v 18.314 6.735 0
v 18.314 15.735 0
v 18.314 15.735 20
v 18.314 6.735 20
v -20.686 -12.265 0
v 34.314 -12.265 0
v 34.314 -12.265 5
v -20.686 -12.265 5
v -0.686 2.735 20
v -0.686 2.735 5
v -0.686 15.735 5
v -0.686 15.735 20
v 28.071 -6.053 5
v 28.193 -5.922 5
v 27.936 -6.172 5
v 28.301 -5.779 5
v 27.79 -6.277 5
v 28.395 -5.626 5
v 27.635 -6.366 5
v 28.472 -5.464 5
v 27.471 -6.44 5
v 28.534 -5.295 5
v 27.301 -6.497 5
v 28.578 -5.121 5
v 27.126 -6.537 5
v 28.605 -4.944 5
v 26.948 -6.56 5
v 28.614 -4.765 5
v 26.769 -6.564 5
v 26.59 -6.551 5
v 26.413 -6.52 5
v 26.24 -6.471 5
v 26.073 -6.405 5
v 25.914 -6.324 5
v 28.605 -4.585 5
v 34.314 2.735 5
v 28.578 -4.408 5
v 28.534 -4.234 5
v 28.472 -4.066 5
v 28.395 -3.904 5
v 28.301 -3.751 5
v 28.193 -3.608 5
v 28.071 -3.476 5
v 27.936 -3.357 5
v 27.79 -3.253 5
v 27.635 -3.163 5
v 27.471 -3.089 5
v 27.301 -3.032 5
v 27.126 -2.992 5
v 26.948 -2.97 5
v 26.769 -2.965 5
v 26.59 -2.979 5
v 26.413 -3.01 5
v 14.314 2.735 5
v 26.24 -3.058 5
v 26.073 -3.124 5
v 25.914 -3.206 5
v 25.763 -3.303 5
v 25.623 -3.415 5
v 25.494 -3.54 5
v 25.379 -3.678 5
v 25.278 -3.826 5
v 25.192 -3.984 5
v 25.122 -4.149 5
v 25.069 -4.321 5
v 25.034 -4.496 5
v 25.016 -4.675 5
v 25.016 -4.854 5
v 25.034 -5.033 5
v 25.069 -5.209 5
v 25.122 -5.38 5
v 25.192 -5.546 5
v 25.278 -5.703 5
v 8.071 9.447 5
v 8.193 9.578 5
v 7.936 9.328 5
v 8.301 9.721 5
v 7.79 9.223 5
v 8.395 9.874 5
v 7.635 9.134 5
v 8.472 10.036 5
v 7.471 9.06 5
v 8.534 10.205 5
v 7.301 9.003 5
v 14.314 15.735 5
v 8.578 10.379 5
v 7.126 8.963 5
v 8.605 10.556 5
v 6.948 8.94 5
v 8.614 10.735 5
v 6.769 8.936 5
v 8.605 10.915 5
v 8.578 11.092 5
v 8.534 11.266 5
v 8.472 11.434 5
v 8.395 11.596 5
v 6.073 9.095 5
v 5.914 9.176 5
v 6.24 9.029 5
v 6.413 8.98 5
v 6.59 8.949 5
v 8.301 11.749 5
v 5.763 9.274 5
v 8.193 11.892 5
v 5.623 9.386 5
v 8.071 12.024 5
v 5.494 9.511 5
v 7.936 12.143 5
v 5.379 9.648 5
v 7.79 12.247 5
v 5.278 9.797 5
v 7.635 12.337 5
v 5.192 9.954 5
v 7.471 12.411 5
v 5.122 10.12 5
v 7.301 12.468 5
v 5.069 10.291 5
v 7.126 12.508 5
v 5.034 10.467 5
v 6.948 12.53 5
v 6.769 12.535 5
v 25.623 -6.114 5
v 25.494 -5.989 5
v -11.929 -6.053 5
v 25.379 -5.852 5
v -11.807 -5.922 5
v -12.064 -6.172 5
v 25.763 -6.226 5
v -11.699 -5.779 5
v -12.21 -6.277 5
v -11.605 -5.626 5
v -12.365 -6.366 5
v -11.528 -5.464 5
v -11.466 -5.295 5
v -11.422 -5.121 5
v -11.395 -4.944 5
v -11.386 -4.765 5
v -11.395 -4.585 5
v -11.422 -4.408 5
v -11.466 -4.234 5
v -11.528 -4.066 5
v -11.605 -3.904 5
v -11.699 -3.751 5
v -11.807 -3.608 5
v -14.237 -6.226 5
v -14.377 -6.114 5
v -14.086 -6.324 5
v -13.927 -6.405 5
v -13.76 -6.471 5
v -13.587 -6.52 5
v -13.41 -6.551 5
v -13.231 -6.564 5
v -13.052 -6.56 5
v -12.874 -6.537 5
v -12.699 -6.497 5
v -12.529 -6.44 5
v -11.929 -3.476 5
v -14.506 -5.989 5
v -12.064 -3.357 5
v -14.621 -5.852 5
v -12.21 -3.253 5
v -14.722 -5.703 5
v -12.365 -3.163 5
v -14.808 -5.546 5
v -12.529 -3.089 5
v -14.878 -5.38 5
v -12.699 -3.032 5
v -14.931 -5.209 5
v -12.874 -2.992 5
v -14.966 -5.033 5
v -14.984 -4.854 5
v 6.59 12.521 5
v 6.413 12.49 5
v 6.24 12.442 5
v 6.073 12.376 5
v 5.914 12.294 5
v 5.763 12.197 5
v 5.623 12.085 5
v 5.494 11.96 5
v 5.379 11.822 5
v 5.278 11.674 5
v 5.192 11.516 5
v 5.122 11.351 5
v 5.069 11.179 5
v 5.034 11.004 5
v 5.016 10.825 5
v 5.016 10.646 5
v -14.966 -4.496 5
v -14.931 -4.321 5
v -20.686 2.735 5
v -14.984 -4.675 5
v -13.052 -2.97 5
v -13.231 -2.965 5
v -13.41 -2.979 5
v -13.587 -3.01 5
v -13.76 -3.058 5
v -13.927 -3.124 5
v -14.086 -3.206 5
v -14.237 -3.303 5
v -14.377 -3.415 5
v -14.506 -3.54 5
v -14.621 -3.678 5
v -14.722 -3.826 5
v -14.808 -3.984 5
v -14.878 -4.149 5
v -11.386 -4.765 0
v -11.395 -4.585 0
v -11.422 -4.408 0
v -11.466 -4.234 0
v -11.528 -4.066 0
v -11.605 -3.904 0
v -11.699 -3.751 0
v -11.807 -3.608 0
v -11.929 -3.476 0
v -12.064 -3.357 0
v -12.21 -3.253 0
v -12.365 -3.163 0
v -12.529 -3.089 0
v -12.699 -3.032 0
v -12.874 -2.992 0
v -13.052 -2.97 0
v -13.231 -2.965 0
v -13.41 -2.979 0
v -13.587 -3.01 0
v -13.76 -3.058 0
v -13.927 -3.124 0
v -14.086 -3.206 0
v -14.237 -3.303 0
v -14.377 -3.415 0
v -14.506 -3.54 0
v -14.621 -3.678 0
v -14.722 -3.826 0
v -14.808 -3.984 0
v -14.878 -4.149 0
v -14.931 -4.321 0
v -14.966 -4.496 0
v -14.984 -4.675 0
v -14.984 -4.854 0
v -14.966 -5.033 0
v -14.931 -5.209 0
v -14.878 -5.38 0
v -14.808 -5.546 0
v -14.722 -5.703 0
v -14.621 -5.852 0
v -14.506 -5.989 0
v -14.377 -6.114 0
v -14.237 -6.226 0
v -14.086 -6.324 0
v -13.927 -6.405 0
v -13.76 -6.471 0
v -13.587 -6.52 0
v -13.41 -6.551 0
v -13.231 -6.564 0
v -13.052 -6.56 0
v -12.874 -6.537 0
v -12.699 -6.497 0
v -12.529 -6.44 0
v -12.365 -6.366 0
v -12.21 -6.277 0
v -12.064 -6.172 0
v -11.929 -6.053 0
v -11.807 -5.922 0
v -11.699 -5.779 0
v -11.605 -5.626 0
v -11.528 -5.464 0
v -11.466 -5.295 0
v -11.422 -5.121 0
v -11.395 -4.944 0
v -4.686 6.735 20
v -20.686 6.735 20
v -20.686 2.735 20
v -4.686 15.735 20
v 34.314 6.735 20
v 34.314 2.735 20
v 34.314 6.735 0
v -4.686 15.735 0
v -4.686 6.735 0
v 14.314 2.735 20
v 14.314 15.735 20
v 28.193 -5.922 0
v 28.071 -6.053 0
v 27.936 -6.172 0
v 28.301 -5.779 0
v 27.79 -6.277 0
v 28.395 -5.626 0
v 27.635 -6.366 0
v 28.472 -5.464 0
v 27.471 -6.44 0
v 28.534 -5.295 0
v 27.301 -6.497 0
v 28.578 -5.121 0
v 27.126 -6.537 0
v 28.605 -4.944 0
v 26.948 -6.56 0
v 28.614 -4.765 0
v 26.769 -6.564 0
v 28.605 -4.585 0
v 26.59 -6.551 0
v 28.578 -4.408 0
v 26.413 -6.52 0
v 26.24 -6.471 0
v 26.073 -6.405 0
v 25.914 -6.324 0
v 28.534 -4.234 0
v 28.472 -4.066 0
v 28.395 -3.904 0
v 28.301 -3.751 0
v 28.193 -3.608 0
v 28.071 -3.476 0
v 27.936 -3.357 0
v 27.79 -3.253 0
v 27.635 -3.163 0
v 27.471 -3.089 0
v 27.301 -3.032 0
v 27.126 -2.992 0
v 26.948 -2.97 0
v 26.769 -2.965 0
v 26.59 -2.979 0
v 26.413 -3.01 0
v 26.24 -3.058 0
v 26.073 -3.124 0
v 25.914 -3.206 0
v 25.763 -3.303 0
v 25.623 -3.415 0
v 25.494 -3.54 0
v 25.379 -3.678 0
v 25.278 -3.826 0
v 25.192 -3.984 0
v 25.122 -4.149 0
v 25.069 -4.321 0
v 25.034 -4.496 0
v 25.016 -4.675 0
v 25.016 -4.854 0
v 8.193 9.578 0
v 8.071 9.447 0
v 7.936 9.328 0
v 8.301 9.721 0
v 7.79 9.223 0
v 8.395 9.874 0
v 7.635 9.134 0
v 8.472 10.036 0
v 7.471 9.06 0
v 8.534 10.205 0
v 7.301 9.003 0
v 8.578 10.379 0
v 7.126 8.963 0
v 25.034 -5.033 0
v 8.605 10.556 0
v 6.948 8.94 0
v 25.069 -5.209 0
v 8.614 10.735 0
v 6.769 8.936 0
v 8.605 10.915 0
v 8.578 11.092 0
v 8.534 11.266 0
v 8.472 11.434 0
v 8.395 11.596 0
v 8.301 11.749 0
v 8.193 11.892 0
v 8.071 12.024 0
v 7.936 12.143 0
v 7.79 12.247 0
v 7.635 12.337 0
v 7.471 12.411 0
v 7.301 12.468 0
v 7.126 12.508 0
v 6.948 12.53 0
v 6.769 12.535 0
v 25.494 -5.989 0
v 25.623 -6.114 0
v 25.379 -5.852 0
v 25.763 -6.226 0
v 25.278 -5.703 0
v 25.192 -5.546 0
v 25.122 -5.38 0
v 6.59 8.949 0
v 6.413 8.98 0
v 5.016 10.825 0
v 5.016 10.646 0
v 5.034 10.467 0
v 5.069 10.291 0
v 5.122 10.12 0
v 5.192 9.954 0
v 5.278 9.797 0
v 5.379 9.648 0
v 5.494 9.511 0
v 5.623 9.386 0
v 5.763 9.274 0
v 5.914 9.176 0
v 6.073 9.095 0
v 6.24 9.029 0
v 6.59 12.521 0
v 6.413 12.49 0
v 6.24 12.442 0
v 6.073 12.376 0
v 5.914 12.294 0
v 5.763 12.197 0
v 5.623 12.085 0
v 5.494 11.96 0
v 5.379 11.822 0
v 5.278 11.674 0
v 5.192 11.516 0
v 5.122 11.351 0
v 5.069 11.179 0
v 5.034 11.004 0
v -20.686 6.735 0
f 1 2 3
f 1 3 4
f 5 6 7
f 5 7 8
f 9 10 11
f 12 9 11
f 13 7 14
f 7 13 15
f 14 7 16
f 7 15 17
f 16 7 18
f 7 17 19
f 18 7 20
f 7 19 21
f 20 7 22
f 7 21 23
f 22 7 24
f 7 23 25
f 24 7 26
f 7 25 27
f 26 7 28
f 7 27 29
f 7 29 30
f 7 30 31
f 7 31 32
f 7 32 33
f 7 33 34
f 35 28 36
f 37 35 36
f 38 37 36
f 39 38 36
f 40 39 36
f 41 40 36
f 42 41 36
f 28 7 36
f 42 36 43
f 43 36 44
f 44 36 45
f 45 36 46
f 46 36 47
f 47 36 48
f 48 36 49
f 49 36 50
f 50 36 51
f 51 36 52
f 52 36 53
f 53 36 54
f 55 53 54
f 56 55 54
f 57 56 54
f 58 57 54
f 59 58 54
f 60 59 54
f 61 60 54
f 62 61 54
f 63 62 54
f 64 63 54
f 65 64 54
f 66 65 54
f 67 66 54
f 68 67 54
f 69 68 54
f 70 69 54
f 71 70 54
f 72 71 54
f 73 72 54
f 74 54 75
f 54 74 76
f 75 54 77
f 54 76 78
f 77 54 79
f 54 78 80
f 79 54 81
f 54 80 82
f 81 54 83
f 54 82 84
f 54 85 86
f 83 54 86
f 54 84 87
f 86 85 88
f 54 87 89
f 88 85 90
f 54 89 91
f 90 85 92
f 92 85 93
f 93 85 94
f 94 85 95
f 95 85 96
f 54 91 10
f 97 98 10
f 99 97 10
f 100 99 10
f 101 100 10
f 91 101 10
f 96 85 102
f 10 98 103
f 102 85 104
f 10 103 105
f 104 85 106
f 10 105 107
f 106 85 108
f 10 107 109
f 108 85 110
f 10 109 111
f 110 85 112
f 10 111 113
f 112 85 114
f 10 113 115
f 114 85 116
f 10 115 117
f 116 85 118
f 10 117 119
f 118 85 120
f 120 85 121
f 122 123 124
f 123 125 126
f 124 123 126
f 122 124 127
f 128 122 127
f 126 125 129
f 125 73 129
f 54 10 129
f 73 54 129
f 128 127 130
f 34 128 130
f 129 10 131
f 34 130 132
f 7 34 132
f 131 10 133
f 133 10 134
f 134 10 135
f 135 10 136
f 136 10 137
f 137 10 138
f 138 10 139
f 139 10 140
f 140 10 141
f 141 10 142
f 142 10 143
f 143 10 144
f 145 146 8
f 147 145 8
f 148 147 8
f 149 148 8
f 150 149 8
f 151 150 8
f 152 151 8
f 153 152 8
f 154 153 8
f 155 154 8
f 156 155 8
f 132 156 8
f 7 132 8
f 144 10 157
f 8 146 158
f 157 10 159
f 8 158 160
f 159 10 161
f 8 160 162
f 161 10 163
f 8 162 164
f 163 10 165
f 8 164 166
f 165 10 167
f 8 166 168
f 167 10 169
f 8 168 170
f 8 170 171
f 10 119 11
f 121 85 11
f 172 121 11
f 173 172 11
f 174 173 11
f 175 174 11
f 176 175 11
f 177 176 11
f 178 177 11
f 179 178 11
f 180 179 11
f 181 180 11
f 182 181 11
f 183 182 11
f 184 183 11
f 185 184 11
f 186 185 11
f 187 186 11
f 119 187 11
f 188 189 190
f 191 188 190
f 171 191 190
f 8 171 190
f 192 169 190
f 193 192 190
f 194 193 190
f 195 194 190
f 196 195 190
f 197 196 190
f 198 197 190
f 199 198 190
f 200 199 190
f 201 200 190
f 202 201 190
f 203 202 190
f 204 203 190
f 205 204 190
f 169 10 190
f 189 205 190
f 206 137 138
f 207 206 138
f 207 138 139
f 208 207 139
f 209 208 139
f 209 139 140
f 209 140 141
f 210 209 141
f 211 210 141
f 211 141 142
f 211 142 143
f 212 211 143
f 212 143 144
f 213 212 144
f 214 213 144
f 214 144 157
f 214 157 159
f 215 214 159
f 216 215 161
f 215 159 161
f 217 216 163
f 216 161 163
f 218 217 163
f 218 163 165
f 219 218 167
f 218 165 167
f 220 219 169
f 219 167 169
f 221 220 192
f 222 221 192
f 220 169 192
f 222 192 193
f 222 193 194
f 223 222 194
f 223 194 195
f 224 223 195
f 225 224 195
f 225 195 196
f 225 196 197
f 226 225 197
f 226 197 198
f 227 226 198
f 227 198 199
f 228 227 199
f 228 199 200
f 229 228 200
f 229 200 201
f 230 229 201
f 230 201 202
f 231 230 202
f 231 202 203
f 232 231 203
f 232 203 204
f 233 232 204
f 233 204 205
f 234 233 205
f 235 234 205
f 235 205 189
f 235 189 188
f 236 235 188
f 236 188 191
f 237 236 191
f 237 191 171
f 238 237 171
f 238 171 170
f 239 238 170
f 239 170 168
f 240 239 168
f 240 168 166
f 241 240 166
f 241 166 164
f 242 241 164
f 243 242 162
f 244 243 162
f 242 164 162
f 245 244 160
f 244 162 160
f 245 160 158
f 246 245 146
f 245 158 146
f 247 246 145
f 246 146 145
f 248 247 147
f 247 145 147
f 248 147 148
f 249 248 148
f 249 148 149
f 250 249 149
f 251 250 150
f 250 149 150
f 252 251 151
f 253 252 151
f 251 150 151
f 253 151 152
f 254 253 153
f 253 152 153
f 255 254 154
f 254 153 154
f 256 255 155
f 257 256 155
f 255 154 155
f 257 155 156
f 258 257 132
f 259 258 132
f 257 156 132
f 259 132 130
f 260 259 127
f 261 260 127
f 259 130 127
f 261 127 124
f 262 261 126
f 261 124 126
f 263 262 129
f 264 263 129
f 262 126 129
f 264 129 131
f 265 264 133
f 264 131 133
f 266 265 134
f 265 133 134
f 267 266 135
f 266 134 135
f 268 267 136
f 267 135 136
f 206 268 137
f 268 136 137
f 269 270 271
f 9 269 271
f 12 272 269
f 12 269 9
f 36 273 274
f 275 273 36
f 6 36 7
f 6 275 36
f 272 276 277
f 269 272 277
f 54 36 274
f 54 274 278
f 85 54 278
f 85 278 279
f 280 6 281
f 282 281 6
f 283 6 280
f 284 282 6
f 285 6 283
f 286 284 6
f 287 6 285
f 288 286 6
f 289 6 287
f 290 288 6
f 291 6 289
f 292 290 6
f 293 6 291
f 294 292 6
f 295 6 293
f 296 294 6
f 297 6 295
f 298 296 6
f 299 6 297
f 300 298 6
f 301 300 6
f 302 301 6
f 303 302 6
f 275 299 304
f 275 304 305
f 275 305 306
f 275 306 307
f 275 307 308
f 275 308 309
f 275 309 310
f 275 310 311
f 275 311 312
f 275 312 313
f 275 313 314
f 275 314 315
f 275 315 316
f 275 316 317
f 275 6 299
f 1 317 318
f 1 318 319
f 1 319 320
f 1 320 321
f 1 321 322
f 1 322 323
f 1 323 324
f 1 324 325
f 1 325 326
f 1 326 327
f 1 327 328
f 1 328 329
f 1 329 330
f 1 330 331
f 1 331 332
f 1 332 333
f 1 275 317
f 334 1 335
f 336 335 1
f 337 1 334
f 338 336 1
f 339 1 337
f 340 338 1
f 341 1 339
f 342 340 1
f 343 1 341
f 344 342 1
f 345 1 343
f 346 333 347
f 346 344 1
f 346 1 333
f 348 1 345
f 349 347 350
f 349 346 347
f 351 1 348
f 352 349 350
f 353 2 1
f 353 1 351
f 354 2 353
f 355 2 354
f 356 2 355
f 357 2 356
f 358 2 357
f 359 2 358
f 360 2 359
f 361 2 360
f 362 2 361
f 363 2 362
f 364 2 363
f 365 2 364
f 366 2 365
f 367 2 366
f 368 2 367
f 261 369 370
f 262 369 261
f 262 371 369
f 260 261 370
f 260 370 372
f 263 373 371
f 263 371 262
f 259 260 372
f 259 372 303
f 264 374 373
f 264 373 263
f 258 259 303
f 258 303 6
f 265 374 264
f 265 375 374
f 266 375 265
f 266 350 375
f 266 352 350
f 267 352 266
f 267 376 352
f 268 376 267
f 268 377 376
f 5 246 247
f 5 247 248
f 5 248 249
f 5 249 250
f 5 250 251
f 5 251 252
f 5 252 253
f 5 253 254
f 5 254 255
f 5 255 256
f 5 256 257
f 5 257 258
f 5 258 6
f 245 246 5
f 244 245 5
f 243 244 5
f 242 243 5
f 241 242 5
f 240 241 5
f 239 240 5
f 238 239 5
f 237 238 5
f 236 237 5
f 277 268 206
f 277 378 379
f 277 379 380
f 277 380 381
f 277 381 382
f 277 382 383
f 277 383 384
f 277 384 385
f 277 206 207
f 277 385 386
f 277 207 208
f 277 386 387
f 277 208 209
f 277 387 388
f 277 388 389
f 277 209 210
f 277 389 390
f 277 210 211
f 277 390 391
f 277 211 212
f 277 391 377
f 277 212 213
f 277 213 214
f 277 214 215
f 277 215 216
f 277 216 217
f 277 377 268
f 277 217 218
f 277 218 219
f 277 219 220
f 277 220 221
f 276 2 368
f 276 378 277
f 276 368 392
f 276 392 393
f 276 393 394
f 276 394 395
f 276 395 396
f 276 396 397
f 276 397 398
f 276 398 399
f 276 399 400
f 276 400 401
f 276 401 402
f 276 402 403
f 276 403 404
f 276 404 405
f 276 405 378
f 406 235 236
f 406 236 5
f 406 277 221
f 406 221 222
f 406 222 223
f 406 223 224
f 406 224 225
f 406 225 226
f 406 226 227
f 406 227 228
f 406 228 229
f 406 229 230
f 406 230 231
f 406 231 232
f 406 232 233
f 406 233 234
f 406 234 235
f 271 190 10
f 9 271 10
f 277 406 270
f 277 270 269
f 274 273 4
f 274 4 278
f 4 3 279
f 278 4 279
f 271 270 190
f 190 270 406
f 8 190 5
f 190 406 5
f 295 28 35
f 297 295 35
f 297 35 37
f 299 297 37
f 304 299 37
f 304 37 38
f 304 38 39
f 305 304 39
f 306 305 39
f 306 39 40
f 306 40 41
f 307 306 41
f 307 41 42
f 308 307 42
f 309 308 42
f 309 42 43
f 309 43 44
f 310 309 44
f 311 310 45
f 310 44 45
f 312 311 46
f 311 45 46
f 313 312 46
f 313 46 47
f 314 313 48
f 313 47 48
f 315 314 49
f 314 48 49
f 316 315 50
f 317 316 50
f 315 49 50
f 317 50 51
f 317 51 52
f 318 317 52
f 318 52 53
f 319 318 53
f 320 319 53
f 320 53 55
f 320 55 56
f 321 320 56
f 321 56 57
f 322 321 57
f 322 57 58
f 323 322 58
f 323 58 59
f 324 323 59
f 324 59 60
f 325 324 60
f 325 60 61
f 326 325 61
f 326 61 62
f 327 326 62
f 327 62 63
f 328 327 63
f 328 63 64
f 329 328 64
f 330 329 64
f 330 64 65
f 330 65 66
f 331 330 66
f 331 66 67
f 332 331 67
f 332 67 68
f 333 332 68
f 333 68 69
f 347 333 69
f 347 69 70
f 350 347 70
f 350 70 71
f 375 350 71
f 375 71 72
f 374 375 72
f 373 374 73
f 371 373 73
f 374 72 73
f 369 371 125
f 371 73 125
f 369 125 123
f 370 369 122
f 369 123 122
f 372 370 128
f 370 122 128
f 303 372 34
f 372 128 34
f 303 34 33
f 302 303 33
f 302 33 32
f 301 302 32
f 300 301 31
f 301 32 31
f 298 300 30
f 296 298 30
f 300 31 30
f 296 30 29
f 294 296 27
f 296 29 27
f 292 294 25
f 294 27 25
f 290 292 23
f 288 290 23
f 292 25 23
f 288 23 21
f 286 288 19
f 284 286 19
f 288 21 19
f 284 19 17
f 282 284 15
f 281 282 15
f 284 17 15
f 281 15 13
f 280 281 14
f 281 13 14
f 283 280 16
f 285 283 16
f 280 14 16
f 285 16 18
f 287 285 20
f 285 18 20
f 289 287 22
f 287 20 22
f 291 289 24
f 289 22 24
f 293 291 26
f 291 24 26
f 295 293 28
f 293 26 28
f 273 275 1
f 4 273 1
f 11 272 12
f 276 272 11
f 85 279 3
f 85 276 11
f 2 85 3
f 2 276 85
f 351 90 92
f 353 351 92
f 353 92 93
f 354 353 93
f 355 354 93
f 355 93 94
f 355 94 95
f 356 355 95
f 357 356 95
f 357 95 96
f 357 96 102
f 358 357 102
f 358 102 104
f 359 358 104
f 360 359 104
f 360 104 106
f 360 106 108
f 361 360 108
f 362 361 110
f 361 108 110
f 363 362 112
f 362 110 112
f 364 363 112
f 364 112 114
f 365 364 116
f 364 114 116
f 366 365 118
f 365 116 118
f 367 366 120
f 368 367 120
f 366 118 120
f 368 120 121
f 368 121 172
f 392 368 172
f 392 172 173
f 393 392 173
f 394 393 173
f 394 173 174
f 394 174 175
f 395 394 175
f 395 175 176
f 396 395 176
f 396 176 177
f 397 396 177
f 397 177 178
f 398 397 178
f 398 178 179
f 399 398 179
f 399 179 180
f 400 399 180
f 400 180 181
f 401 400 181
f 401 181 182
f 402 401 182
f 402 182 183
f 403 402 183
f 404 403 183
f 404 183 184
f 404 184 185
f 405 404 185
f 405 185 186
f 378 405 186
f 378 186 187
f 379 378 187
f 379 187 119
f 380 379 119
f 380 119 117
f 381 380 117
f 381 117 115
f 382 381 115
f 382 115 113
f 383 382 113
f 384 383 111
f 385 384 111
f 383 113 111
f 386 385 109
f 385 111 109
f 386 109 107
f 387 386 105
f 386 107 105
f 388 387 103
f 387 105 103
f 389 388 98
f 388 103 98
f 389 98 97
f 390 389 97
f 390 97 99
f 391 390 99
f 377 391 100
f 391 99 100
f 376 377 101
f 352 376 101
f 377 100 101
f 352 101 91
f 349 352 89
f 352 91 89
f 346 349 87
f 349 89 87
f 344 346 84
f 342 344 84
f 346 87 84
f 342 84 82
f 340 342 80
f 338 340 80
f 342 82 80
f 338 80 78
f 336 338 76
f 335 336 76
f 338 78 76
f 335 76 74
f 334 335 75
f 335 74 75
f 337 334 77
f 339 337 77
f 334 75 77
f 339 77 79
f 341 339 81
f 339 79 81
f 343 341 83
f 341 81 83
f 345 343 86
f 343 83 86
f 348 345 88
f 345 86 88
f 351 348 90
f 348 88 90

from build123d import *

# Parameters (mm, degrees)
BOSS_EXTRUDE1_DEPTH = 5
BOSS_EXTRUDE2_DEPTH = 20
SKETCH6_R           = 1.8
CUT_EXTRUDE3_DEPTH  = 6


with BuildPart() as part:
    # Sketch1 → Boss-Extrude1 (new body)
    with BuildSketch(Plane.XY):
        Polygon((14.31372549, 2.735294118), (34.31372549, 2.735294118), (34.31372549, -12.264705882), (-20.68627451, -12.264705882), (-20.68627451, 2.735294118), (-0.68627451, 2.735294118), (-0.68627451, 15.735294118), (14.31372549, 15.735294118), align=None)
    extrude(amount=BOSS_EXTRUDE1_DEPTH)

    # Sketch2 → Boss-Extrude2 (add)
    with BuildSketch(Plane(origin=(0, 0, 0), x_dir=(-1, 0, 0), z_dir=(0, 0, -1))):
        Polygon((0.68627451, 15.735294118), (4.68627451, 15.735294118), (4.68627451, 6.735294118), (6.079970528, 6.735294118), (20.68627451, 6.735294118), (20.68627451, 2.735294118), (0.68627451, 2.735294118), align=None)
    boss_extrude2 = extrude(amount=-BOSS_EXTRUDE2_DEPTH)

    # Mirror1: Boss-Extrude2 across plane
    add(boss_extrude2.mirror(Plane.ZY.offset(-6.81372549)))

    # Sketch6 → Cut-Extrude3 (cut, through all)
    with BuildSketch(Plane.XY.offset(5)):
        with Locations((6.81372549, 10.735294118)):
            Circle(SKETCH6_R)
        with Locations((-13.18627451, -4.764705882)):
            Circle(SKETCH6_R)
        with Locations((26.81372549, -4.764705882)):
            Circle(SKETCH6_R)
    extrude(amount=-CUT_EXTRUDE3_DEPTH, mode=Mode.SUBTRACT)


solid = part.part
